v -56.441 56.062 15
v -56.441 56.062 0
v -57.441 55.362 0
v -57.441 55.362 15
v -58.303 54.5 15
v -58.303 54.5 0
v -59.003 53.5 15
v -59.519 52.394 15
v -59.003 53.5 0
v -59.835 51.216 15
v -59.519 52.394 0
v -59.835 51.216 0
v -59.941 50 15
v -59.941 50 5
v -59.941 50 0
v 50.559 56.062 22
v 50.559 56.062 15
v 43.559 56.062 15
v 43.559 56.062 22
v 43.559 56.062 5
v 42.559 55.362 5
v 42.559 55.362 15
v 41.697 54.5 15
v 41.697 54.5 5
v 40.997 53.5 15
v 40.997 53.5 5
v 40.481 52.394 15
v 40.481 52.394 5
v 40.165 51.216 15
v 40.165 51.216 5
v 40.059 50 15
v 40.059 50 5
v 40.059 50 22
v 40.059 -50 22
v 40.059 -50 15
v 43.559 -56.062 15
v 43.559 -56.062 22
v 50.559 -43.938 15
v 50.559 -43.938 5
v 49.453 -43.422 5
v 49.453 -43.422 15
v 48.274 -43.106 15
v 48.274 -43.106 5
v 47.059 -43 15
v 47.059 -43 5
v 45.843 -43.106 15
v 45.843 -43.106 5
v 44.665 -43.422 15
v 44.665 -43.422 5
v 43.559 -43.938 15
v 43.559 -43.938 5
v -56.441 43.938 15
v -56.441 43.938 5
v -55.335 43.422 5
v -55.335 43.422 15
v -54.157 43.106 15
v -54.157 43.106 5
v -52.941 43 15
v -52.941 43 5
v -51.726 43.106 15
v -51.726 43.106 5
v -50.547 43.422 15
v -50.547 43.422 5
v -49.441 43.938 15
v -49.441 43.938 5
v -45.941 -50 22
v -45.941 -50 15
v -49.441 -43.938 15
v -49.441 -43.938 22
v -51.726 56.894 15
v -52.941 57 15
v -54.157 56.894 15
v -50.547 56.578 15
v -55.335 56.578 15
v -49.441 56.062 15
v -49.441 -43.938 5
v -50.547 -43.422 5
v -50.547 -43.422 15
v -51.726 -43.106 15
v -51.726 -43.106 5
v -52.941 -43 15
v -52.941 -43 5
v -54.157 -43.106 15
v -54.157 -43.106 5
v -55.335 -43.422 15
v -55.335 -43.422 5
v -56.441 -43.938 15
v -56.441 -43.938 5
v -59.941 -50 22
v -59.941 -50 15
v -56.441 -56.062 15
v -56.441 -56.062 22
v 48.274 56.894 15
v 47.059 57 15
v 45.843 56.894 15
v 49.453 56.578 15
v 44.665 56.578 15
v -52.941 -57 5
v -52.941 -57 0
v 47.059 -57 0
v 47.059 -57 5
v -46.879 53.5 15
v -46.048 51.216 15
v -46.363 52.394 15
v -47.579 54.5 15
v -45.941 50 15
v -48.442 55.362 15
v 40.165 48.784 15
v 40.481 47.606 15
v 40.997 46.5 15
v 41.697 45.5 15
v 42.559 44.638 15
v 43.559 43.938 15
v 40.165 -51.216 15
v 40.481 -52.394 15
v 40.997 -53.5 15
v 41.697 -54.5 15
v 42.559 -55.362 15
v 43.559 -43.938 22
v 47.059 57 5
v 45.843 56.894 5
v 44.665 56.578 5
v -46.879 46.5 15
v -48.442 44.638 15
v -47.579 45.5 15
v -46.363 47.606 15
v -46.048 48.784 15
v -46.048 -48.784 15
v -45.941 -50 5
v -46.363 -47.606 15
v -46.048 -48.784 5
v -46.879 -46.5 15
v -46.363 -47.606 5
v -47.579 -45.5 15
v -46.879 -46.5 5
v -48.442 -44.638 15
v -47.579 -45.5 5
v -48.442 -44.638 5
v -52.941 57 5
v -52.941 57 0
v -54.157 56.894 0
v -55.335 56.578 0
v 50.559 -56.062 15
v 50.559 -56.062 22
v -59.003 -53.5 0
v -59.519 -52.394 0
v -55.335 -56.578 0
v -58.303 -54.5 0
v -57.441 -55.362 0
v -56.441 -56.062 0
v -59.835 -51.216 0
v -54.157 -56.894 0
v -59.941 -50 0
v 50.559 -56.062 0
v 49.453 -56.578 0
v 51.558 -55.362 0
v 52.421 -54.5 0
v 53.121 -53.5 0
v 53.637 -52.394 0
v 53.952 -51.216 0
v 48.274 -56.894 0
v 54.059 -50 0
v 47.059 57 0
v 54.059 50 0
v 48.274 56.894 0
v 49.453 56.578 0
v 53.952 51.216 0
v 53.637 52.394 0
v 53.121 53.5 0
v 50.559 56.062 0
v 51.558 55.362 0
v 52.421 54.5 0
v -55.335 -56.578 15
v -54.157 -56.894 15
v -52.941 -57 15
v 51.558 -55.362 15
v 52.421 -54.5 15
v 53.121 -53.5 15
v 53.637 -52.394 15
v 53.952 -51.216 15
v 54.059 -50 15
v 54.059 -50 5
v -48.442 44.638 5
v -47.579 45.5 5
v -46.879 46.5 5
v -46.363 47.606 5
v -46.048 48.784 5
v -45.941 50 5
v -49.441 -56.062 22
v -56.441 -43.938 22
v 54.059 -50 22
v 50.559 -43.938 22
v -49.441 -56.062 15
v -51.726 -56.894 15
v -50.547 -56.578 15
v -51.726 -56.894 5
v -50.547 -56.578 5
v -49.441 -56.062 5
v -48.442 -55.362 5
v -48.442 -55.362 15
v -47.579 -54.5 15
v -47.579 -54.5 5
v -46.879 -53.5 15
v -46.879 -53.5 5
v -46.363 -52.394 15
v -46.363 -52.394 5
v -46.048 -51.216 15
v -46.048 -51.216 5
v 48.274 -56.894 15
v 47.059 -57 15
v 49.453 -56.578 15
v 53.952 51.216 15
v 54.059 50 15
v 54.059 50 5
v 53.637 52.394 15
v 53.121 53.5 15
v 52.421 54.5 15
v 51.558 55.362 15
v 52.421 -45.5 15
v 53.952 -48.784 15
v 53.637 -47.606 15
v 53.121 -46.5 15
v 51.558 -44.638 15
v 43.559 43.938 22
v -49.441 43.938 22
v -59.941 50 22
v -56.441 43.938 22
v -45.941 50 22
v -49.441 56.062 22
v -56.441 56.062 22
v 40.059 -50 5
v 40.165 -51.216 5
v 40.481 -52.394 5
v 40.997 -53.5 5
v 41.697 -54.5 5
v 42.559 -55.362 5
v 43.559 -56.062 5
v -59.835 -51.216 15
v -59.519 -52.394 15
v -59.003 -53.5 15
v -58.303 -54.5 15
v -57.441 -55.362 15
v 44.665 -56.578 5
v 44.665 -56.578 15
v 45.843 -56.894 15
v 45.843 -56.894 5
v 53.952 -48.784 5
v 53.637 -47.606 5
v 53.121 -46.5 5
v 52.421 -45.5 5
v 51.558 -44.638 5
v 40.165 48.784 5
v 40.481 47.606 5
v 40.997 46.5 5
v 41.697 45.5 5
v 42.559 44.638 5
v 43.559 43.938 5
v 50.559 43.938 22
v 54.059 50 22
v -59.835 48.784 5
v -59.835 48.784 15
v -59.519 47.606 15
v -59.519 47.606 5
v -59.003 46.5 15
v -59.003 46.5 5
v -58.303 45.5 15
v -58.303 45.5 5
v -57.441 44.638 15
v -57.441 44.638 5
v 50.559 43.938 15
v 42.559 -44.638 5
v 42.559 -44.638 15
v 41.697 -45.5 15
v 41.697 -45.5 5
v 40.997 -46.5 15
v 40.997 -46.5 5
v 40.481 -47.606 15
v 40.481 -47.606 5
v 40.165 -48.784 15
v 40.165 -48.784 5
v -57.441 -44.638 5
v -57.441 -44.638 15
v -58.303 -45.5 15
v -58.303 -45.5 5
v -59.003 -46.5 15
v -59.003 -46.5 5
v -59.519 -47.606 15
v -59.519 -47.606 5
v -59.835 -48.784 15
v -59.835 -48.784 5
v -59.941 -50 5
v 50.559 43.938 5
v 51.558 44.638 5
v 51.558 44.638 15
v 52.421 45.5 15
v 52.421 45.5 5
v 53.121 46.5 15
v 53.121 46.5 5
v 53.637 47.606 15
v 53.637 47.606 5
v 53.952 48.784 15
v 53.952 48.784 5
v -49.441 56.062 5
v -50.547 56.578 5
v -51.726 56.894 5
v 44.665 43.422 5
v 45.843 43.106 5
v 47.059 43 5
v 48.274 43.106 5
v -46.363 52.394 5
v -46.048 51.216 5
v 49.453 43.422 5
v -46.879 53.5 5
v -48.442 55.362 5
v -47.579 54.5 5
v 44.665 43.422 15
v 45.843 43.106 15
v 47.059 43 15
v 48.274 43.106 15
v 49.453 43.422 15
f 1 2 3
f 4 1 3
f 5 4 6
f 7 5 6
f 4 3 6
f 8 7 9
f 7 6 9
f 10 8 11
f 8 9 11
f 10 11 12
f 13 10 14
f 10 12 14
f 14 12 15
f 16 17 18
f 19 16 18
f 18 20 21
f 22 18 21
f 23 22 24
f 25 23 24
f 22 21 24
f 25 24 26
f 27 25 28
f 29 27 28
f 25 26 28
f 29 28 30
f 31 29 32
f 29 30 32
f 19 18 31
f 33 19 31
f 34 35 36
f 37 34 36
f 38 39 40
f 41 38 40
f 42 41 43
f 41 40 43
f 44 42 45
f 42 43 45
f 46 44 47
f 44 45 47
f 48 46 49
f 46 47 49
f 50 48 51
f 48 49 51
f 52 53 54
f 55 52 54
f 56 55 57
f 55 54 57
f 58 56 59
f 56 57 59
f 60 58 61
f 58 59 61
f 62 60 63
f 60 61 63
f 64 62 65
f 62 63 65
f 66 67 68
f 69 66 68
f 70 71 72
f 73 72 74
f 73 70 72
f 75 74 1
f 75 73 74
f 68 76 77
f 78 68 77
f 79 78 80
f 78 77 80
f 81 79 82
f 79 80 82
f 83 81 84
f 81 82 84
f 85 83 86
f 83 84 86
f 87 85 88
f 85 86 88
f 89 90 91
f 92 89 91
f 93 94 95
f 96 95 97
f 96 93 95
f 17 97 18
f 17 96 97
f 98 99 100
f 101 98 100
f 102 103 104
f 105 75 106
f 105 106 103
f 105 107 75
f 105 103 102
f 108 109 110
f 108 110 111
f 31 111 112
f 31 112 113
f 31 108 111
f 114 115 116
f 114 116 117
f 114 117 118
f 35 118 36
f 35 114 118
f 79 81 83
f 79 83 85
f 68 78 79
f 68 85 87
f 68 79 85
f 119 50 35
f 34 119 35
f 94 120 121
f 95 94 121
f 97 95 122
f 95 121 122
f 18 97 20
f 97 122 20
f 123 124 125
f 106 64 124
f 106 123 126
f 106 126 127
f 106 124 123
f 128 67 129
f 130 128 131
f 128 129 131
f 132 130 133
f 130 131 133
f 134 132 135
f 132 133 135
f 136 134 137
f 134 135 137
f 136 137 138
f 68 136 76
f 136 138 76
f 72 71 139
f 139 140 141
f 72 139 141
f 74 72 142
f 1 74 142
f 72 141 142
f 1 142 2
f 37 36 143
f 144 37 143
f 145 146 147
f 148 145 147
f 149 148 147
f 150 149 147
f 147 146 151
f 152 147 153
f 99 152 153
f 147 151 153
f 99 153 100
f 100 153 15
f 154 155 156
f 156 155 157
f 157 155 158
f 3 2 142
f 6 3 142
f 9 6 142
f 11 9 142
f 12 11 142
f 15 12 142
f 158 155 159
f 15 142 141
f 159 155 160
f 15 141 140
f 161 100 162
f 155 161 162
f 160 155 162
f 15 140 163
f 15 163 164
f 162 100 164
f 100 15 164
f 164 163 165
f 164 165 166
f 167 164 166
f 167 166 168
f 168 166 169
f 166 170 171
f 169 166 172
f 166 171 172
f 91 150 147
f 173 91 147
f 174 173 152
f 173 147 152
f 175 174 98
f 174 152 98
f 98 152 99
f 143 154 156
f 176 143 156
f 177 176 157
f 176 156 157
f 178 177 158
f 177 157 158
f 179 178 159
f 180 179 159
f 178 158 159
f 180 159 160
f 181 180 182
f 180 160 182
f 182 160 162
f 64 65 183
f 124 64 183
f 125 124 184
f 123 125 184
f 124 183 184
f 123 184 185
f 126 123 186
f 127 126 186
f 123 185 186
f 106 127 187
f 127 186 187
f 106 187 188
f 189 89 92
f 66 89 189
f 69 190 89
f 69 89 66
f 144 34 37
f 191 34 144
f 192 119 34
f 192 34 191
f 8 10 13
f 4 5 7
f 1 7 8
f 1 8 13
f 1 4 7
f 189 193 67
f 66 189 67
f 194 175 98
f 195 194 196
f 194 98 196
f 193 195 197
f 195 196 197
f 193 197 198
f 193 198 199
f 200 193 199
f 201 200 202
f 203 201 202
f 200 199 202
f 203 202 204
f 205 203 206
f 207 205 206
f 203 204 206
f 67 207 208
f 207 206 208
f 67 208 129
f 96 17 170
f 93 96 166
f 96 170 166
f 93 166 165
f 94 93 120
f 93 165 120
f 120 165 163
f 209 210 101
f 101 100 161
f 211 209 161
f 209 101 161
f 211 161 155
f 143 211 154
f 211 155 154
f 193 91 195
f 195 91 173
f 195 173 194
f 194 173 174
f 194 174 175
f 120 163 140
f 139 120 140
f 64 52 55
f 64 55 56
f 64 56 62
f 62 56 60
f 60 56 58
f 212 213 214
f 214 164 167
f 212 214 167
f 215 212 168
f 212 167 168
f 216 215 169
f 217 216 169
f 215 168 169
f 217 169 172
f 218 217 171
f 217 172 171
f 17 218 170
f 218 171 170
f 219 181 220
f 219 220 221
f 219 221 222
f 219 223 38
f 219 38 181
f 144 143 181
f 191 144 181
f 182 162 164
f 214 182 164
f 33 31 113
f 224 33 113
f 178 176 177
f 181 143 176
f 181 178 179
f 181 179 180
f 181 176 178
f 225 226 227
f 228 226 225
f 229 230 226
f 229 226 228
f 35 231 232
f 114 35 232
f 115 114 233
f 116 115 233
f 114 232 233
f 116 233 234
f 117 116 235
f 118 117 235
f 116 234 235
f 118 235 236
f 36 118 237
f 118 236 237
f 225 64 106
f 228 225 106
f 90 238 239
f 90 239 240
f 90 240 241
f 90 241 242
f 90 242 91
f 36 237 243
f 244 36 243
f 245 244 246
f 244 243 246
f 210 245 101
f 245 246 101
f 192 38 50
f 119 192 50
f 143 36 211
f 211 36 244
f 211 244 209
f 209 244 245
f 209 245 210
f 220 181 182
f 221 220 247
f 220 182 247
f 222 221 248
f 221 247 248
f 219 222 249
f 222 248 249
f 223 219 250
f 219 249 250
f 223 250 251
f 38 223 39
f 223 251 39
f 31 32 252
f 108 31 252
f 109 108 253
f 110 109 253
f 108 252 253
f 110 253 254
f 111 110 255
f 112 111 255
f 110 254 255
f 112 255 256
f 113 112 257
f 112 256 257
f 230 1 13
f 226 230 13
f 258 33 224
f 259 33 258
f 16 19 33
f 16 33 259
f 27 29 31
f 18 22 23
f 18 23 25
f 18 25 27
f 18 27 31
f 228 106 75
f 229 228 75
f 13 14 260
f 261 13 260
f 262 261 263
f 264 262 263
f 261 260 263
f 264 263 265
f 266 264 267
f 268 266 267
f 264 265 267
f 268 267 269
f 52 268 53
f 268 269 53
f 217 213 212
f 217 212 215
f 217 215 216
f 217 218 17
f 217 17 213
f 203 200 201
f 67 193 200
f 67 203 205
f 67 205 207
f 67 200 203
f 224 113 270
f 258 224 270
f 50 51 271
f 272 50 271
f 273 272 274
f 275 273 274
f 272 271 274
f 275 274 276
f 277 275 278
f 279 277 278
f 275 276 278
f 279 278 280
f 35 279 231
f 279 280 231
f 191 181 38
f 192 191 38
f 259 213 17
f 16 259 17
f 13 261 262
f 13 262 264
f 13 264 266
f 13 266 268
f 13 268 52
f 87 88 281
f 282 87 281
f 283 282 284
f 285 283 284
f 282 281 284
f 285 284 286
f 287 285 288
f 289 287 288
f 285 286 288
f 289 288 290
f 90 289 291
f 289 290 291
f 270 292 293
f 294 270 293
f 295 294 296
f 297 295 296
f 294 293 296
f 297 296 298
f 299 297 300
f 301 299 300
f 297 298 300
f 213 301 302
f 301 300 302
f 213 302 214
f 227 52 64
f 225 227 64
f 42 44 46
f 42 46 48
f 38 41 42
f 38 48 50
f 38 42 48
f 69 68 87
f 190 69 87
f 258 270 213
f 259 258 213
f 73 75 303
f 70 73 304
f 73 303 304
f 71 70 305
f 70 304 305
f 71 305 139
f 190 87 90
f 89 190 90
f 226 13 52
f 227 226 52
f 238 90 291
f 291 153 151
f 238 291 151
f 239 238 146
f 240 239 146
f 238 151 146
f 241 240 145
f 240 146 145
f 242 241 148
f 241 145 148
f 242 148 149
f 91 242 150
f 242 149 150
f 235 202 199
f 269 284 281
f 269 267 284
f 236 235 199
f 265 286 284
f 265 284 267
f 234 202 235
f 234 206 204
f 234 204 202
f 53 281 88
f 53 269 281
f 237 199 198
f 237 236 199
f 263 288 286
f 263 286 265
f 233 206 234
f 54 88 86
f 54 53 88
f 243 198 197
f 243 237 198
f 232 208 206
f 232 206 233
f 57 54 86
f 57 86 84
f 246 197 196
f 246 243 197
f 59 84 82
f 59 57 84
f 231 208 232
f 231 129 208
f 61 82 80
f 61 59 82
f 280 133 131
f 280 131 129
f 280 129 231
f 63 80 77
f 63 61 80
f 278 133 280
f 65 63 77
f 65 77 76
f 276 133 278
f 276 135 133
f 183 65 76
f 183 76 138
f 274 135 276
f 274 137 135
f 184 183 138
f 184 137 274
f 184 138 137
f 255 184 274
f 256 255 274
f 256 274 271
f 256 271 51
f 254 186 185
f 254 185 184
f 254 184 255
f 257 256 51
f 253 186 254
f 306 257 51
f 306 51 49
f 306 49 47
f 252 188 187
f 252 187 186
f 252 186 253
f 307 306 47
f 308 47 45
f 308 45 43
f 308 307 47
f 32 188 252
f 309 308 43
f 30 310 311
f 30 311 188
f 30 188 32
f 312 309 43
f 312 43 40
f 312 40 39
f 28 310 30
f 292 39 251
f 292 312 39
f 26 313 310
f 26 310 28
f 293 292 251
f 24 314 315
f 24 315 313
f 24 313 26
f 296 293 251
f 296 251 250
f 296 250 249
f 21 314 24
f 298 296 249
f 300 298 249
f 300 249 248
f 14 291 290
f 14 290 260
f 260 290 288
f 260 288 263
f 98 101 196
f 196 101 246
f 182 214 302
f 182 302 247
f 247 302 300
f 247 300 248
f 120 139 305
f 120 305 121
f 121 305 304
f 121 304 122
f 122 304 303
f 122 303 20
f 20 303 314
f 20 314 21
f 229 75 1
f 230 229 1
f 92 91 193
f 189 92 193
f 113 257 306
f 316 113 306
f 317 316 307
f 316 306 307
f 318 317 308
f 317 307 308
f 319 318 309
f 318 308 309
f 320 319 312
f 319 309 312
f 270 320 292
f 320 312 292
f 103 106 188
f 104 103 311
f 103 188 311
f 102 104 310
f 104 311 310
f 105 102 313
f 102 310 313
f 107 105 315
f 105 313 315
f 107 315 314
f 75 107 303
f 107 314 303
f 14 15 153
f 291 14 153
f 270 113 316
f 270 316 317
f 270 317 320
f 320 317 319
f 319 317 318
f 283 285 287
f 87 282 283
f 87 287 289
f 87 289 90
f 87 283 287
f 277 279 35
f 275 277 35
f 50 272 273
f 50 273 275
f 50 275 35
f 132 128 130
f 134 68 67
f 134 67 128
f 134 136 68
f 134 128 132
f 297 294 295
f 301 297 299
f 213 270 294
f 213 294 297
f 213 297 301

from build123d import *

# Parameters (mm, degrees)
F1_DEPTH = 5
F2_DEPTH = 15
F3_DEPTH = 22


with BuildPart() as f1:
    # F0 (on Top) → F1 (new body)
    with BuildSketch(Plane.XY):
        with BuildLine():
            ThreePointArc((-49.4411764706, 56.0621778265), (-46.8789986441, 53.5), (-45.9411764706, 50))
            ThreePointArc((-45.9411764706, 50), (-46.8789986441, 46.5), (-49.4411764706, 43.9378221735))
            ThreePointArc((-49.4411764706, 43.9378221735), (-52.9411764706, 43), (-56.4411764706, 43.9378221735))
            ThreePointArc((-56.4411764706, 43.9378221735), (-59.0033542971, 46.5), (-59.9411764706, 50))
            Line((-59.9411764706, 50), (-59.9411764706, -50))
            ThreePointArc((-59.9411764706, -50), (-59.0033542971, -46.5), (-56.4411764706, -43.9378221735))
            ThreePointArc((-56.4411764706, -43.9378221735), (-52.9411764706, -43), (-49.4411764706, -43.9378221735))
            ThreePointArc((-49.4411764706, -43.9378221735), (-46.8789986441, -46.5), (-45.9411764706, -50))
            ThreePointArc((-45.9411764706, -50), (-46.8789986441, -53.5), (-49.4411764706, -56.0621778265))
            ThreePointArc((-49.4411764706, -56.0621778265), (-51.1294431549, -56.761480784), (-52.9411764706, -57))
            Line((-52.9411764706, -57), (47.0588235294, -57))
            ThreePointArc((47.0588235294, -57), (45.2470902137, -56.761480784), (43.5588235294, -56.0621778265))
            ThreePointArc((43.5588235294, -56.0621778265), (40.9966457029, -53.5), (40.0588235294, -50))
            ThreePointArc((40.0588235294, -50), (40.9966457029, -46.5), (43.5588235294, -43.9378221735))
            ThreePointArc((43.5588235294, -43.9378221735), (47.0588235294, -43), (50.5588235294, -43.9378221735))
            ThreePointArc((50.5588235294, -43.9378221735), (53.1210013559, -46.5), (54.0588235294, -50))
            Line((54.0588235294, -50), (54.0588235294, 50))
            ThreePointArc((54.0588235294, 50), (53.1210013559, 46.5), (50.5588235294, 43.9378221735))
            ThreePointArc((50.5588235294, 43.9378221735), (47.0588235294, 43), (43.5588235294, 43.9378221735))
            ThreePointArc((43.5588235294, 43.9378221735), (40.9966457029, 46.5), (40.0588235294, 50))
            ThreePointArc((40.0588235294, 50), (40.9966457029, 53.5), (43.5588235294, 56.0621778265))
            ThreePointArc((43.5588235294, 56.0621778265), (45.2470902137, 56.761480784), (47.0588235294, 57))
            Line((47.0588235294, 57), (-52.9411764706, 57))
            ThreePointArc((-52.9411764706, 57), (-51.1294431549, 56.761480784), (-49.4411764706, 56.0621778265))
        make_face()
    extrude(amount=F1_DEPTH)

    # F0 (on Top) → F2 (join)
    with BuildSketch(Plane.XY):
        Polygon((-49.4411764706, 43.9378221735), (-45.9411764706, 50), (-49.4411764706, 56.0621778265), (-56.4411764706, 56.0621778265), (-59.9411764706, 50), (-56.4411764706, 43.9378221735), align=None)
        Polygon((50.5588235294, -56.0621778265), (54.0588235294, -50), (50.5588235294, -43.9378221735), (43.5588235294, -43.9378221735), (40.0588235294, -50), (43.5588235294, -56.0621778265), align=None)
        Polygon((-56.4411764706, -43.9378221735), (-59.9411764706, -50), (-56.4411764706, -56.0621778265), (-49.4411764706, -56.0621778265), (-45.9411764706, -50), (-49.4411764706, -43.9378221735), align=None)
        with BuildLine():
            ThreePointArc((50.5588235294, -56.0621778265), (53.1210013559, -53.5), (54.0588235294, -50))
            Line((54.0588235294, -50), (50.5588235294, -56.0621778265))
        make_face()
        with BuildLine():
            Line((43.5588235294, -43.9378221735), (50.5588235294, -43.9378221735))
            ThreePointArc((50.5588235294, -43.9378221735), (47.0588235294, -43), (43.5588235294, -43.9378221735))
        make_face()
        with BuildLine():
            Line((40.0588235294, -50), (43.5588235294, -43.9378221735))
            ThreePointArc((43.5588235294, -43.9378221735), (40.9966457029, -46.5), (40.0588235294, -50))
        make_face()
        with BuildLine():
            ThreePointArc((40.0588235294, -50), (40.9966457029, -53.5), (43.5588235294, -56.0621778265))
            Line((43.5588235294, -56.0621778265), (40.0588235294, -50))
        make_face()
        with BuildLine():
            ThreePointArc((-45.9411764706, -50), (-46.8789986441, -46.5), (-49.4411764706, -43.9378221735))
            Line((-49.4411764706, -43.9378221735), (-45.9411764706, -50))
        make_face()
        with BuildLine():
            ThreePointArc((-49.4411764706, -43.9378221735), (-52.9411764706, -43), (-56.4411764706, -43.9378221735))
            Line((-56.4411764706, -43.9378221735), (-49.4411764706, -43.9378221735))
        make_face()
        with BuildLine():
            Line((-45.9411764706, -50), (-49.4411764706, -56.0621778265))
            ThreePointArc((-49.4411764706, -56.0621778265), (-46.8789986441, -53.5), (-45.9411764706, -50))
        make_face()
        with BuildLine():
            ThreePointArc((-56.4411764706, -43.9378221735), (-59.0033542971, -46.5), (-59.9411764706, -50))
            Line((-59.9411764706, -50), (-56.4411764706, -43.9378221735))
        make_face()
        with BuildLine():
            Line((-49.4411764706, -56.0621778265), (-56.4411764706, -56.0621778265))
            ThreePointArc((-56.4411764706, -56.0621778265), (-54.7529097863, -56.761480784), (-52.9411764706, -57))
            ThreePointArc((-52.9411764706, -57), (-51.1294431549, -56.761480784), (-49.4411764706, -56.0621778265))
        make_face()
        with BuildLine():
            Line((-56.4411764706, -56.0621778265), (-59.9411764706, -50))
            ThreePointArc((-59.9411764706, -50), (-59.0033542971, -53.5), (-56.4411764706, -56.0621778265))
        make_face()
        with BuildLine():
            Line((-56.4411764706, 56.0621778265), (-49.4411764706, 56.0621778265))
            ThreePointArc((-49.4411764706, 56.0621778265), (-51.1294431549, 56.761480784), (-52.9411764706, 57))
            ThreePointArc((-52.9411764706, 57), (-54.7529097863, 56.761480784), (-56.4411764706, 56.0621778265))
        make_face()
        with BuildLine():
            Line((-49.4411764706, 56.0621778265), (-45.9411764706, 50))
            ThreePointArc((-45.9411764706, 50), (-46.8789986441, 53.5), (-49.4411764706, 56.0621778265))
        make_face()
        with BuildLine():
            ThreePointArc((-49.4411764706, 43.9378221735), (-46.8789986441, 46.5), (-45.9411764706, 50))
            Line((-45.9411764706, 50), (-49.4411764706, 43.9378221735))
        make_face()
        with BuildLine():
            Line((-59.9411764706, 50), (-56.4411764706, 56.0621778265))
            ThreePointArc((-56.4411764706, 56.0621778265), (-59.0033542971, 53.5), (-59.9411764706, 50))
        make_face()
        with BuildLine():
            ThreePointArc((-59.9411764706, 50), (-59.0033542971, 46.5), (-56.4411764706, 43.9378221735))
            Line((-56.4411764706, 43.9378221735), (-59.9411764706, 50))
        make_face()
        with BuildLine():
            ThreePointArc((-56.4411764706, 43.9378221735), (-52.9411764706, 43), (-49.4411764706, 43.9378221735))
            Line((-49.4411764706, 43.9378221735), (-56.4411764706, 43.9378221735))
        make_face()
        with BuildLine():
            ThreePointArc((50.5588235294, 56.0621778265), (48.8705568451, 56.761480784), (47.0588235294, 57))
            ThreePointArc((47.0588235294, 57), (45.2470902137, 56.761480784), (43.5588235294, 56.0621778265))
            Line((43.5588235294, 56.0621778265), (50.5588235294, 56.0621778265))
        make_face()
        with BuildLine():
            ThreePointArc((54.0588235294, 50), (53.1210013559, 53.5), (50.5588235294, 56.0621778265))
            Line((50.5588235294, 56.0621778265), (54.0588235294, 50))
        make_face()
        with BuildLine():
            ThreePointArc((50.5588235294, 43.9378221735), (53.1210013559, 46.5), (54.0588235294, 50))
            Line((54.0588235294, 50), (50.5588235294, 43.9378221735))
        make_face()
        with BuildLine():
            ThreePointArc((43.5588235294, 43.9378221735), (47.0588235294, 43), (50.5588235294, 43.9378221735))
            Line((50.5588235294, 43.9378221735), (43.5588235294, 43.9378221735))
        make_face()
        with BuildLine():
            Line((43.5588235294, 43.9378221735), (40.0588235294, 50))
            ThreePointArc((40.0588235294, 50), (40.9966457029, 46.5), (43.5588235294, 43.9378221735))
        make_face()
        with BuildLine():
            Line((40.0588235294, 50), (43.5588235294, 56.0621778265))
            ThreePointArc((43.5588235294, 56.0621778265), (40.9966457029, 53.5), (40.0588235294, 50))
        make_face()
        Polygon((54.0588235294, 50), (50.5588235294, 56.0621778265), (43.5588235294, 56.0621778265), (40.0588235294, 50), (43.5588235294, 43.9378221735), (50.5588235294, 43.9378221735), align=None)
        with BuildLine():
            ThreePointArc((47.0588235294, -57), (48.8705568451, -56.761480784), (50.5588235294, -56.0621778265))
            Line((50.5588235294, -56.0621778265), (43.5588235294, -56.0621778265))
            ThreePointArc((43.5588235294, -56.0621778265), (45.2470902137, -56.761480784), (47.0588235294, -57))
        make_face()
        with BuildLine():
            Line((50.5588235294, -43.9378221735), (54.0588235294, -50))
            ThreePointArc((54.0588235294, -50), (53.1210013559, -46.5), (50.5588235294, -43.9378221735))
        make_face()
    extrude(amount=F2_DEPTH)

    # F0 (on Top) → F3 (join)
    with BuildSketch(Plane.XY):
        Polygon((-49.4411764706, 43.9378221735), (-45.9411764706, 50), (-49.4411764706, 56.0621778265), (-56.4411764706, 56.0621778265), (-59.9411764706, 50), (-56.4411764706, 43.9378221735), align=None)
        Polygon((50.5588235294, -56.0621778265), (54.0588235294, -50), (50.5588235294, -43.9378221735), (43.5588235294, -43.9378221735), (40.0588235294, -50), (43.5588235294, -56.0621778265), align=None)
        Polygon((-56.4411764706, -43.9378221735), (-59.9411764706, -50), (-56.4411764706, -56.0621778265), (-49.4411764706, -56.0621778265), (-45.9411764706, -50), (-49.4411764706, -43.9378221735), align=None)
        Polygon((54.0588235294, 50), (50.5588235294, 56.0621778265), (43.5588235294, 56.0621778265), (40.0588235294, 50), (43.5588235294, 43.9378221735), (50.5588235294, 43.9378221735), align=None)
    extrude(amount=F3_DEPTH)


solid = f1.part
